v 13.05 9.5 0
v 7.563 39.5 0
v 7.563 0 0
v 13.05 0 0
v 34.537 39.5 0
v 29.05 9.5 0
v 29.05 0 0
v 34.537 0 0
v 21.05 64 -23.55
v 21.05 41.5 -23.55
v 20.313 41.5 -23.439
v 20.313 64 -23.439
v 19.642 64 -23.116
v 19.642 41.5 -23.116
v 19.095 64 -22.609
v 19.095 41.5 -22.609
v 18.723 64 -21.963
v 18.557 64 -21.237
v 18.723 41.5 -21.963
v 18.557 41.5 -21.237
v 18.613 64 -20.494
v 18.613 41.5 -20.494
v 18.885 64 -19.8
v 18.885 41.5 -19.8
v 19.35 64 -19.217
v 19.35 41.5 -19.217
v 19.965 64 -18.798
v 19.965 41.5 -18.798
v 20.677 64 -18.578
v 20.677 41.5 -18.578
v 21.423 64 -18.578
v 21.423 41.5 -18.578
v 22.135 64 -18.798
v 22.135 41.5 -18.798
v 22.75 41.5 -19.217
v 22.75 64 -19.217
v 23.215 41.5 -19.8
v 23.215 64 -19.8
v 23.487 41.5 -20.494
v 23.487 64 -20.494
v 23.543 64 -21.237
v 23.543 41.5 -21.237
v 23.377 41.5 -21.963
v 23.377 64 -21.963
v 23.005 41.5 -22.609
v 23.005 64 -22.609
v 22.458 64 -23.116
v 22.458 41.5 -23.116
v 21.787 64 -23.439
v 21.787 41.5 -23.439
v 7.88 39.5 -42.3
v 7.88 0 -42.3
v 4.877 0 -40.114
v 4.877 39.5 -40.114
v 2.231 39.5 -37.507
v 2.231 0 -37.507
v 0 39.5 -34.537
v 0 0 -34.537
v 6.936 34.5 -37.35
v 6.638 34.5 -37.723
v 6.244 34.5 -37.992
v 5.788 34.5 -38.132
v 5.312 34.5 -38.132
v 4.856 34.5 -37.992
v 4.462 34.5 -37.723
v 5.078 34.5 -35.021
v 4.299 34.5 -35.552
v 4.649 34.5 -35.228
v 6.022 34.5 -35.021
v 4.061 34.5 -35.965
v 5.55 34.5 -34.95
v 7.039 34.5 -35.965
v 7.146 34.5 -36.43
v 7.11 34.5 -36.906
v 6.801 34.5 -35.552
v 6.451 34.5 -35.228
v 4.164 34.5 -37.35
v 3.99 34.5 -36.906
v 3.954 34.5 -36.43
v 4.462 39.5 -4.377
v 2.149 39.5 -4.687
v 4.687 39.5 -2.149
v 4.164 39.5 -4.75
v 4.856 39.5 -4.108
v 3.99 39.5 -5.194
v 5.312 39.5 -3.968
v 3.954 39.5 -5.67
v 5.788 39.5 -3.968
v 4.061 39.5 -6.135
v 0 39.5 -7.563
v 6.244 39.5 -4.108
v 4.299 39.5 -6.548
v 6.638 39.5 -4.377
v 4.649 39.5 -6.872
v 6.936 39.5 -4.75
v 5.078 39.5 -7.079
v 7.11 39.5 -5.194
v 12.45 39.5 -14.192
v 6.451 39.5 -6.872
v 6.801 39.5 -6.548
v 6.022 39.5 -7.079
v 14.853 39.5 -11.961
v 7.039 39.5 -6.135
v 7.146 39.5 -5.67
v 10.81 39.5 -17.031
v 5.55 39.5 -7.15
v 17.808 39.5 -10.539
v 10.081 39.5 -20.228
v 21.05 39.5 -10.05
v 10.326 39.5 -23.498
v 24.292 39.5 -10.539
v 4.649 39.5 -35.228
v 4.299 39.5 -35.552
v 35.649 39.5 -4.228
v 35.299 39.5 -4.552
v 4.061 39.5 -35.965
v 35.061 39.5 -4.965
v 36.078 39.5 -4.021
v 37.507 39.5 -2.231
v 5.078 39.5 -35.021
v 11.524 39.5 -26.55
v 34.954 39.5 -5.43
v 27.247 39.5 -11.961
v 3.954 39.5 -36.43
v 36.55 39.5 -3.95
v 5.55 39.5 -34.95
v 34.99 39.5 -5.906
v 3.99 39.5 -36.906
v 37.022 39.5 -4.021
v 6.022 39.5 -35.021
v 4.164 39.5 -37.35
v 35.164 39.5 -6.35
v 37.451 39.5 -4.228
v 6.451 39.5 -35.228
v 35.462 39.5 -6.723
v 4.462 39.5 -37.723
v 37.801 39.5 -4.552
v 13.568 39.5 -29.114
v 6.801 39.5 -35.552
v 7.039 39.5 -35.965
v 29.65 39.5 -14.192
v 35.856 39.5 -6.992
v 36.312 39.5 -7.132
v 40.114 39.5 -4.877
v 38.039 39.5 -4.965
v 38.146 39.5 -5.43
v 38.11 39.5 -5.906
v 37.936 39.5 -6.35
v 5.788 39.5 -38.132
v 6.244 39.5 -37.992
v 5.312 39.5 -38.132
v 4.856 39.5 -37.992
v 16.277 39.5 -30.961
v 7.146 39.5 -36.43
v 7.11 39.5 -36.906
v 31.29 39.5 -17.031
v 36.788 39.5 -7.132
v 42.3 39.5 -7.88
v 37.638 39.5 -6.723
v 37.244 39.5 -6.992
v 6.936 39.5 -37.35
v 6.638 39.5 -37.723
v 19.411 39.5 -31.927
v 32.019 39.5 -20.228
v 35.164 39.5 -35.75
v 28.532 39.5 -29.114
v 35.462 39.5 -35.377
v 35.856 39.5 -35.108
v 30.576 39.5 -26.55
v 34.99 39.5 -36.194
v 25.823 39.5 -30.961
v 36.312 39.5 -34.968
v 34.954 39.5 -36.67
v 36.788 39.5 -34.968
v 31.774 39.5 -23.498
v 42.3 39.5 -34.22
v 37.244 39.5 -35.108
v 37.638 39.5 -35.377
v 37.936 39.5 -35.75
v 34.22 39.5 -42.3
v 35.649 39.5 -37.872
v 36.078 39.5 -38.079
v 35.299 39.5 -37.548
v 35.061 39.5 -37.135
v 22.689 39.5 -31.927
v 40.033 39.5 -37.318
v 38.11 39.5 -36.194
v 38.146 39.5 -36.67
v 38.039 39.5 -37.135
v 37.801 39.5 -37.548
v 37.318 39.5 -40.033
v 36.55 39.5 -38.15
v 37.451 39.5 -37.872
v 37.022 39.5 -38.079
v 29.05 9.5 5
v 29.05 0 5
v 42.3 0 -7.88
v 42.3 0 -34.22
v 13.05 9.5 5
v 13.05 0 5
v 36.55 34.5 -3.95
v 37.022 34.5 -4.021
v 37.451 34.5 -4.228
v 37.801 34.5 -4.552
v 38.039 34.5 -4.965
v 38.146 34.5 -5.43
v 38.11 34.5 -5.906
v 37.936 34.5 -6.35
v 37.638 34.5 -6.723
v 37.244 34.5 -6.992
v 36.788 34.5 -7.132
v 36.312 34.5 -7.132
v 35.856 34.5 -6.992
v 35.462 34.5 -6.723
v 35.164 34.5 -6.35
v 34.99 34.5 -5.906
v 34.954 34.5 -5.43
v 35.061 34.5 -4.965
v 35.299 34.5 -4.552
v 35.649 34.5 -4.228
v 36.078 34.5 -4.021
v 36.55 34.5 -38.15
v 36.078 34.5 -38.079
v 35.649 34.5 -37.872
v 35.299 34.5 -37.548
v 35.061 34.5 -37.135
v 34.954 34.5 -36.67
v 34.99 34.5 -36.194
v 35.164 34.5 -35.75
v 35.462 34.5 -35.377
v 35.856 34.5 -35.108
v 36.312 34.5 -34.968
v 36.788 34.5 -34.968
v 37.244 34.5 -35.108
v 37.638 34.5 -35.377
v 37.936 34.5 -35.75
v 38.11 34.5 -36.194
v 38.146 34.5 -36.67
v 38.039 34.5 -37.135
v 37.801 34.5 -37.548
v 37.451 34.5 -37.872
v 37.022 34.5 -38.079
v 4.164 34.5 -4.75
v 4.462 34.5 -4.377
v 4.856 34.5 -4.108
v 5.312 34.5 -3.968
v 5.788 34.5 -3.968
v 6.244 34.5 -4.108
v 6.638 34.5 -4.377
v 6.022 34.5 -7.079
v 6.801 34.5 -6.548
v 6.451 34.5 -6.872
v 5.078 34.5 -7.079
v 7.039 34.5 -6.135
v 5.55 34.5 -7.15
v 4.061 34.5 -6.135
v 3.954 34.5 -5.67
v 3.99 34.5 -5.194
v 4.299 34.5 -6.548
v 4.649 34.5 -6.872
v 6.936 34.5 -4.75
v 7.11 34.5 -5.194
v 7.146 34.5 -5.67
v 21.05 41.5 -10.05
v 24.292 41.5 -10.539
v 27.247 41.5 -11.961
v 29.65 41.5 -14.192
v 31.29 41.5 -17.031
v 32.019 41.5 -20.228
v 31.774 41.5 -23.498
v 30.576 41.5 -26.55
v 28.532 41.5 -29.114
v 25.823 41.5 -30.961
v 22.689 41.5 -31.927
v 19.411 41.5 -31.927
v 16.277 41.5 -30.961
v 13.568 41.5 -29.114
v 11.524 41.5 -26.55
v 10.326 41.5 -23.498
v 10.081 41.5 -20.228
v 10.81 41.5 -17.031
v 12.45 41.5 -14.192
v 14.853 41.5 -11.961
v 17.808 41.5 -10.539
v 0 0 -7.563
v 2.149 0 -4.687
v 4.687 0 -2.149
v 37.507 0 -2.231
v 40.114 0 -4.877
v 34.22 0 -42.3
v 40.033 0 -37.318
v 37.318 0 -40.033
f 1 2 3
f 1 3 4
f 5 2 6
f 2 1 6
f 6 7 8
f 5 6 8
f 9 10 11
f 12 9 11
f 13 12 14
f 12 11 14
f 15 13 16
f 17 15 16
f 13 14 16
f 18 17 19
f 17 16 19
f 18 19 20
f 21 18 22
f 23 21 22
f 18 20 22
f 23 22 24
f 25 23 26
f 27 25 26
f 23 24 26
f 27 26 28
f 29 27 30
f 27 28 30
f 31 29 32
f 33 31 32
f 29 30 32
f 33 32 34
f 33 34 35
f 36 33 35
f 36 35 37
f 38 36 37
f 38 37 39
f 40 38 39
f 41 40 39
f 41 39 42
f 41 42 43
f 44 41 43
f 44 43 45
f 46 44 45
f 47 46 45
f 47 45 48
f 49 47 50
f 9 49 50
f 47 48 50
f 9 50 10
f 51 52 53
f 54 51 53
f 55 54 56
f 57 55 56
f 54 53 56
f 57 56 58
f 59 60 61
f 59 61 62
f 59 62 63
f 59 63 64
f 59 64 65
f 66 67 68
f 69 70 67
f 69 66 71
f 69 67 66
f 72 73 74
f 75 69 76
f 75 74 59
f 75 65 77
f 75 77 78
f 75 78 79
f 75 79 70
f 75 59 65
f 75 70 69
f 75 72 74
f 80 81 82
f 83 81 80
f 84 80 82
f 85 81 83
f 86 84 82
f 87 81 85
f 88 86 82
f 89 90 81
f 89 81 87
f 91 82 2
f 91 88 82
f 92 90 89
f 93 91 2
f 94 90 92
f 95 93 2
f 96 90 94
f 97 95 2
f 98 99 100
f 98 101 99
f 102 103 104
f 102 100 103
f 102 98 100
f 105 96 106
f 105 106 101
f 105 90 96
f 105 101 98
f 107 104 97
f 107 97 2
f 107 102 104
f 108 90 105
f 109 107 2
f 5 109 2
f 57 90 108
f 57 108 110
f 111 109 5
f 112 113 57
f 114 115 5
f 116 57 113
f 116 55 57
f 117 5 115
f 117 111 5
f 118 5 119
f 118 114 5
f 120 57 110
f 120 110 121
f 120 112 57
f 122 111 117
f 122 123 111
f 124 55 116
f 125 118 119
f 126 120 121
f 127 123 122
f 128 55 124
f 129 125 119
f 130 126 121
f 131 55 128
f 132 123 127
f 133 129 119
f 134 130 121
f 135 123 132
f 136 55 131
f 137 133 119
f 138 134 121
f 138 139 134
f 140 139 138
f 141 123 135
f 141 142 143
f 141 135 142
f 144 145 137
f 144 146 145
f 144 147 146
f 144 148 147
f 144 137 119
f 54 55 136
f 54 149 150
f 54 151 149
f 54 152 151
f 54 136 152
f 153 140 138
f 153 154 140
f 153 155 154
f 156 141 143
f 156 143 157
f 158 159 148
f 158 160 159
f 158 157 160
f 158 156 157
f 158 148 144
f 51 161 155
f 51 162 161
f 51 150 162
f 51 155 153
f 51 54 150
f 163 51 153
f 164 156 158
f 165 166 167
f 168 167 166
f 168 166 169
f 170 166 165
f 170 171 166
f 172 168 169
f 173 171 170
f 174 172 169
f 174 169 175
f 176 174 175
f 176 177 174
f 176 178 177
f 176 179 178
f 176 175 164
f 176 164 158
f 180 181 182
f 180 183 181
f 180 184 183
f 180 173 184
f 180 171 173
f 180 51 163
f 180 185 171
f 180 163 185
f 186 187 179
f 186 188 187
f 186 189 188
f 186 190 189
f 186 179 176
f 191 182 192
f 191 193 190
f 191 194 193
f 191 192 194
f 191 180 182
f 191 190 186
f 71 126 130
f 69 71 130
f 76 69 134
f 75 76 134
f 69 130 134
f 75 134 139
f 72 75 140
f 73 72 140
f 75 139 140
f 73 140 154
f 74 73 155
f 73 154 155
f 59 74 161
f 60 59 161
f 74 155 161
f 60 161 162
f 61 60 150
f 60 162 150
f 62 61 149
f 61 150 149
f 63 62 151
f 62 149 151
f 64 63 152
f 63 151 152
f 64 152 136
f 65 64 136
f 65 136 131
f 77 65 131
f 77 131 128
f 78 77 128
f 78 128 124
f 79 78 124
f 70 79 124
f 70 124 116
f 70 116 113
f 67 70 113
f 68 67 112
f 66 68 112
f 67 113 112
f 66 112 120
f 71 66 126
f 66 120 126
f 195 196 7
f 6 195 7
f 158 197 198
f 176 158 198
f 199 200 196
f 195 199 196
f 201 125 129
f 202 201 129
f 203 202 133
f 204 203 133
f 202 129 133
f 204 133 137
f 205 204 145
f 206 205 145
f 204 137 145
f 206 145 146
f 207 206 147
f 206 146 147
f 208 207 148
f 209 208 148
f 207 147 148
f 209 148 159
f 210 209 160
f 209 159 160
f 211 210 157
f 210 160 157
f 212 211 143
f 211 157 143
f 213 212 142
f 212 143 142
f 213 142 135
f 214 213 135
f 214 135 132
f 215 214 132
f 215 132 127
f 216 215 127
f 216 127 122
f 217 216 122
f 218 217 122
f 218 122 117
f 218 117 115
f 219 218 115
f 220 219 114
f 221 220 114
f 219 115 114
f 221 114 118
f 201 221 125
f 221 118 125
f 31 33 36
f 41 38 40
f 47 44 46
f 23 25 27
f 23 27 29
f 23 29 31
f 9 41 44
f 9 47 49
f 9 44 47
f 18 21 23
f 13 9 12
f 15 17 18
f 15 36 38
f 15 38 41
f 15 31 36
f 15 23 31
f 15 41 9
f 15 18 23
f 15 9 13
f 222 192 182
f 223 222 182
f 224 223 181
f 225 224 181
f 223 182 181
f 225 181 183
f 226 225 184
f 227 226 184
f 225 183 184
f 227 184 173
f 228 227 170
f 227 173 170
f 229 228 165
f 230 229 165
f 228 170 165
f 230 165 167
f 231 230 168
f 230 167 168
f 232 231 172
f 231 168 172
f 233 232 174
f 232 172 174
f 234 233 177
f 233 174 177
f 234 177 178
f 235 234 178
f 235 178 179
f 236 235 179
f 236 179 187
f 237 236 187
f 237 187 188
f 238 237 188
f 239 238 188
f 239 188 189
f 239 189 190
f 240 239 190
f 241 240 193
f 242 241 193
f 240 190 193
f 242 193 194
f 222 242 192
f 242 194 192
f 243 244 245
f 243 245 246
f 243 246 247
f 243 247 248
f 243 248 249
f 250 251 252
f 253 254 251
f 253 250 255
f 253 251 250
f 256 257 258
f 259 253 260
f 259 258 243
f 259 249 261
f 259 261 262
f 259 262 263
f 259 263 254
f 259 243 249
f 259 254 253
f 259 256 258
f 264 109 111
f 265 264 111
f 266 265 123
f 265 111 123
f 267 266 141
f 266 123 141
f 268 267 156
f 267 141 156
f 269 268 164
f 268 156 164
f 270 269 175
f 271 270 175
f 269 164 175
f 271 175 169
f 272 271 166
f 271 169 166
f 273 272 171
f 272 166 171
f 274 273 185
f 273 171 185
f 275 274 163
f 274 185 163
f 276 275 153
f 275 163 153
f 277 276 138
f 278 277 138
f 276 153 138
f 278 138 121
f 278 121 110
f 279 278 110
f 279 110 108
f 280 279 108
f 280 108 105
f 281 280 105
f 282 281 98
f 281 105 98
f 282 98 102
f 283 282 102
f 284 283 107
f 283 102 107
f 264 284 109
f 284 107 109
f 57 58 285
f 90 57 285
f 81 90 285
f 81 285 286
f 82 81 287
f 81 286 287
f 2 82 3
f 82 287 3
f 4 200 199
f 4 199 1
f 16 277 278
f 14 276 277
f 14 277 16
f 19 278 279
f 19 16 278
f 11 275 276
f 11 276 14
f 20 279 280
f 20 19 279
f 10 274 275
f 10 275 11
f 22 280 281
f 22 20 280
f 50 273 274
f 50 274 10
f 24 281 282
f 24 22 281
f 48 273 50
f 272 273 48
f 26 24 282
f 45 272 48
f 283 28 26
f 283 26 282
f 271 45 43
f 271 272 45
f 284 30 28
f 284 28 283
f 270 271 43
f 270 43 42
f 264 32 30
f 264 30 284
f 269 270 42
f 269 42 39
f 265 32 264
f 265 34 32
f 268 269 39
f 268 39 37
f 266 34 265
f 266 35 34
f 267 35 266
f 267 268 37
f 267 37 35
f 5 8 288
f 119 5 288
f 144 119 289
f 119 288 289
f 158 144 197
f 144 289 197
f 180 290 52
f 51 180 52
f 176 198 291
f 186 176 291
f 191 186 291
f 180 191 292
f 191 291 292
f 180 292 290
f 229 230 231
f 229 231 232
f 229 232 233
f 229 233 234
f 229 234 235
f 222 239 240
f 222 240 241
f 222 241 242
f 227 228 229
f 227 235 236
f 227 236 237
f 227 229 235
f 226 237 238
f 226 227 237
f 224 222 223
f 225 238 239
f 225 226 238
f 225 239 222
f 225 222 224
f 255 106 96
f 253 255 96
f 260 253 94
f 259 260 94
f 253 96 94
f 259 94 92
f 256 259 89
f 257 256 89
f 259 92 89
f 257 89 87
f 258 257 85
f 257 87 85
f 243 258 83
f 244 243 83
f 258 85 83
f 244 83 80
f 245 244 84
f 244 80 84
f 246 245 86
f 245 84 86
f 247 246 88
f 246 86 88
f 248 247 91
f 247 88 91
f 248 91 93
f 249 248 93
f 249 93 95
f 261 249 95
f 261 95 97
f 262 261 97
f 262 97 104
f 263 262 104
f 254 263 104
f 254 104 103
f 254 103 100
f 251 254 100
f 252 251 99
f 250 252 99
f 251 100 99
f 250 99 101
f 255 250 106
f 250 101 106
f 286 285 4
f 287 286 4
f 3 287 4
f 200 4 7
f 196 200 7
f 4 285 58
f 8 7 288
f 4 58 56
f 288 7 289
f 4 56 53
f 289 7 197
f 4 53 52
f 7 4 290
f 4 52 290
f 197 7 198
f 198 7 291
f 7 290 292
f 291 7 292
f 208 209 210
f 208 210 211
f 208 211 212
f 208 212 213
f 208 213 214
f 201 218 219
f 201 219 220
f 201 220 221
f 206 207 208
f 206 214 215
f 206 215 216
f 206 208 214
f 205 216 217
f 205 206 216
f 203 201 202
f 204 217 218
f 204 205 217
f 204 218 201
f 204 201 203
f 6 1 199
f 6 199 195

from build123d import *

# Parameters (mm, degrees)
EXTRUDE_1_DEPTH     = 39.5
SKETCH_2_R          = 11
EXTRUDE_2_DEPTH     = 2
SKETCH_3_R          = 2.5
EXTRUDE_3_DEPTH     = 22.5
SKETCH_4_W          = 16
SKETCH_4_H          = 5
EXTRUDE_4_DEPTH     = 9.5
SKETCH_5_R          = 1.6
CUT_EXTRUDE_1_DEPTH = 5


with BuildPart() as part:
    # 草图1 → 凸台-拉伸1 (new body)
    with BuildSketch(Plane(origin=(0, 0, 0), x_dir=(1, 0, 0), z_dir=(0, 1, 0))):
        with BuildLine():
            ThreePointArc((0, 7.563061875), (3.37233047, 3.37233047), (7.563061875, 0))
            Line((7.563061875, 0), (34.536938125, 0))
            ThreePointArc((34.536938125, 0), (38.859801315, 3.505457341), (42.3, 7.880432809))
            Line((42.3, 7.880432809), (42.3, 34.219567191))
            ThreePointArc((42.3, 34.219567191), (38.72766953, 38.72766953), (34.219567191, 42.3))
            Line((34.219567191, 42.3), (7.880432809, 42.3))
            ThreePointArc((7.880432809, 42.3), (3.505457341, 38.859801315), (0, 34.536938125))
            Line((0, 34.536938125), (0, 7.563061875))
        make_face()
    extrude(amount=EXTRUDE_1_DEPTH)

    # 草图2 → 凸台-拉伸2 (add)
    with BuildSketch(Plane(origin=(0, 39.5, 0), x_dir=(1, 0, 0), z_dir=(0, 1, 0))):
        with Locations(Location((21.05, 21.05, 0), (0, 0, 270))):
            Circle(SKETCH_2_R)
    extrude(amount=EXTRUDE_2_DEPTH)

    # 草图3 → 凸台-拉伸3 (add)
    with BuildSketch(Plane(origin=(0, 41.5, 0), x_dir=(1, 0, 0), z_dir=(0, 1, 0))):
        with Locations(Location((21.05, 21.05, 0), (0, 0, 90))):
            Circle(SKETCH_3_R)
    extrude(amount=EXTRUDE_3_DEPTH)

    # 草图4 → 凸台-拉伸4 (add)
    with BuildSketch(Plane(origin=(0, 0, 0), x_dir=(1, 0, 0), z_dir=(0, 1, 0))):
        with Locations((21.05, -2.5)):
            Rectangle(SKETCH_4_W, SKETCH_4_H)
    extrude(amount=EXTRUDE_4_DEPTH)

    # 草图5 → 切除-拉伸1 (cut)
    with BuildSketch(Plane(origin=(0, 39.5, 0), x_dir=(1, 0, 0), z_dir=(0, 1, 0))):
        with Locations(Location((5.55, 36.55, 0), (0, 0, 270))):
            Circle(SKETCH_5_R)
        with Locations(Location((36.55, 36.55, 0), (0, 0, 90))):
            Circle(SKETCH_5_R)
        with Locations(Location((36.55, 5.55, 0), (0, 0, 270))):
            Circle(SKETCH_5_R)
        with Locations(Location((5.55, 5.55, 0), (0, 0, 90))):
            Circle(SKETCH_5_R)
    extrude(amount=-CUT_EXTRUDE_1_DEPTH, mode=Mode.SUBTRACT)


solid = part.part
